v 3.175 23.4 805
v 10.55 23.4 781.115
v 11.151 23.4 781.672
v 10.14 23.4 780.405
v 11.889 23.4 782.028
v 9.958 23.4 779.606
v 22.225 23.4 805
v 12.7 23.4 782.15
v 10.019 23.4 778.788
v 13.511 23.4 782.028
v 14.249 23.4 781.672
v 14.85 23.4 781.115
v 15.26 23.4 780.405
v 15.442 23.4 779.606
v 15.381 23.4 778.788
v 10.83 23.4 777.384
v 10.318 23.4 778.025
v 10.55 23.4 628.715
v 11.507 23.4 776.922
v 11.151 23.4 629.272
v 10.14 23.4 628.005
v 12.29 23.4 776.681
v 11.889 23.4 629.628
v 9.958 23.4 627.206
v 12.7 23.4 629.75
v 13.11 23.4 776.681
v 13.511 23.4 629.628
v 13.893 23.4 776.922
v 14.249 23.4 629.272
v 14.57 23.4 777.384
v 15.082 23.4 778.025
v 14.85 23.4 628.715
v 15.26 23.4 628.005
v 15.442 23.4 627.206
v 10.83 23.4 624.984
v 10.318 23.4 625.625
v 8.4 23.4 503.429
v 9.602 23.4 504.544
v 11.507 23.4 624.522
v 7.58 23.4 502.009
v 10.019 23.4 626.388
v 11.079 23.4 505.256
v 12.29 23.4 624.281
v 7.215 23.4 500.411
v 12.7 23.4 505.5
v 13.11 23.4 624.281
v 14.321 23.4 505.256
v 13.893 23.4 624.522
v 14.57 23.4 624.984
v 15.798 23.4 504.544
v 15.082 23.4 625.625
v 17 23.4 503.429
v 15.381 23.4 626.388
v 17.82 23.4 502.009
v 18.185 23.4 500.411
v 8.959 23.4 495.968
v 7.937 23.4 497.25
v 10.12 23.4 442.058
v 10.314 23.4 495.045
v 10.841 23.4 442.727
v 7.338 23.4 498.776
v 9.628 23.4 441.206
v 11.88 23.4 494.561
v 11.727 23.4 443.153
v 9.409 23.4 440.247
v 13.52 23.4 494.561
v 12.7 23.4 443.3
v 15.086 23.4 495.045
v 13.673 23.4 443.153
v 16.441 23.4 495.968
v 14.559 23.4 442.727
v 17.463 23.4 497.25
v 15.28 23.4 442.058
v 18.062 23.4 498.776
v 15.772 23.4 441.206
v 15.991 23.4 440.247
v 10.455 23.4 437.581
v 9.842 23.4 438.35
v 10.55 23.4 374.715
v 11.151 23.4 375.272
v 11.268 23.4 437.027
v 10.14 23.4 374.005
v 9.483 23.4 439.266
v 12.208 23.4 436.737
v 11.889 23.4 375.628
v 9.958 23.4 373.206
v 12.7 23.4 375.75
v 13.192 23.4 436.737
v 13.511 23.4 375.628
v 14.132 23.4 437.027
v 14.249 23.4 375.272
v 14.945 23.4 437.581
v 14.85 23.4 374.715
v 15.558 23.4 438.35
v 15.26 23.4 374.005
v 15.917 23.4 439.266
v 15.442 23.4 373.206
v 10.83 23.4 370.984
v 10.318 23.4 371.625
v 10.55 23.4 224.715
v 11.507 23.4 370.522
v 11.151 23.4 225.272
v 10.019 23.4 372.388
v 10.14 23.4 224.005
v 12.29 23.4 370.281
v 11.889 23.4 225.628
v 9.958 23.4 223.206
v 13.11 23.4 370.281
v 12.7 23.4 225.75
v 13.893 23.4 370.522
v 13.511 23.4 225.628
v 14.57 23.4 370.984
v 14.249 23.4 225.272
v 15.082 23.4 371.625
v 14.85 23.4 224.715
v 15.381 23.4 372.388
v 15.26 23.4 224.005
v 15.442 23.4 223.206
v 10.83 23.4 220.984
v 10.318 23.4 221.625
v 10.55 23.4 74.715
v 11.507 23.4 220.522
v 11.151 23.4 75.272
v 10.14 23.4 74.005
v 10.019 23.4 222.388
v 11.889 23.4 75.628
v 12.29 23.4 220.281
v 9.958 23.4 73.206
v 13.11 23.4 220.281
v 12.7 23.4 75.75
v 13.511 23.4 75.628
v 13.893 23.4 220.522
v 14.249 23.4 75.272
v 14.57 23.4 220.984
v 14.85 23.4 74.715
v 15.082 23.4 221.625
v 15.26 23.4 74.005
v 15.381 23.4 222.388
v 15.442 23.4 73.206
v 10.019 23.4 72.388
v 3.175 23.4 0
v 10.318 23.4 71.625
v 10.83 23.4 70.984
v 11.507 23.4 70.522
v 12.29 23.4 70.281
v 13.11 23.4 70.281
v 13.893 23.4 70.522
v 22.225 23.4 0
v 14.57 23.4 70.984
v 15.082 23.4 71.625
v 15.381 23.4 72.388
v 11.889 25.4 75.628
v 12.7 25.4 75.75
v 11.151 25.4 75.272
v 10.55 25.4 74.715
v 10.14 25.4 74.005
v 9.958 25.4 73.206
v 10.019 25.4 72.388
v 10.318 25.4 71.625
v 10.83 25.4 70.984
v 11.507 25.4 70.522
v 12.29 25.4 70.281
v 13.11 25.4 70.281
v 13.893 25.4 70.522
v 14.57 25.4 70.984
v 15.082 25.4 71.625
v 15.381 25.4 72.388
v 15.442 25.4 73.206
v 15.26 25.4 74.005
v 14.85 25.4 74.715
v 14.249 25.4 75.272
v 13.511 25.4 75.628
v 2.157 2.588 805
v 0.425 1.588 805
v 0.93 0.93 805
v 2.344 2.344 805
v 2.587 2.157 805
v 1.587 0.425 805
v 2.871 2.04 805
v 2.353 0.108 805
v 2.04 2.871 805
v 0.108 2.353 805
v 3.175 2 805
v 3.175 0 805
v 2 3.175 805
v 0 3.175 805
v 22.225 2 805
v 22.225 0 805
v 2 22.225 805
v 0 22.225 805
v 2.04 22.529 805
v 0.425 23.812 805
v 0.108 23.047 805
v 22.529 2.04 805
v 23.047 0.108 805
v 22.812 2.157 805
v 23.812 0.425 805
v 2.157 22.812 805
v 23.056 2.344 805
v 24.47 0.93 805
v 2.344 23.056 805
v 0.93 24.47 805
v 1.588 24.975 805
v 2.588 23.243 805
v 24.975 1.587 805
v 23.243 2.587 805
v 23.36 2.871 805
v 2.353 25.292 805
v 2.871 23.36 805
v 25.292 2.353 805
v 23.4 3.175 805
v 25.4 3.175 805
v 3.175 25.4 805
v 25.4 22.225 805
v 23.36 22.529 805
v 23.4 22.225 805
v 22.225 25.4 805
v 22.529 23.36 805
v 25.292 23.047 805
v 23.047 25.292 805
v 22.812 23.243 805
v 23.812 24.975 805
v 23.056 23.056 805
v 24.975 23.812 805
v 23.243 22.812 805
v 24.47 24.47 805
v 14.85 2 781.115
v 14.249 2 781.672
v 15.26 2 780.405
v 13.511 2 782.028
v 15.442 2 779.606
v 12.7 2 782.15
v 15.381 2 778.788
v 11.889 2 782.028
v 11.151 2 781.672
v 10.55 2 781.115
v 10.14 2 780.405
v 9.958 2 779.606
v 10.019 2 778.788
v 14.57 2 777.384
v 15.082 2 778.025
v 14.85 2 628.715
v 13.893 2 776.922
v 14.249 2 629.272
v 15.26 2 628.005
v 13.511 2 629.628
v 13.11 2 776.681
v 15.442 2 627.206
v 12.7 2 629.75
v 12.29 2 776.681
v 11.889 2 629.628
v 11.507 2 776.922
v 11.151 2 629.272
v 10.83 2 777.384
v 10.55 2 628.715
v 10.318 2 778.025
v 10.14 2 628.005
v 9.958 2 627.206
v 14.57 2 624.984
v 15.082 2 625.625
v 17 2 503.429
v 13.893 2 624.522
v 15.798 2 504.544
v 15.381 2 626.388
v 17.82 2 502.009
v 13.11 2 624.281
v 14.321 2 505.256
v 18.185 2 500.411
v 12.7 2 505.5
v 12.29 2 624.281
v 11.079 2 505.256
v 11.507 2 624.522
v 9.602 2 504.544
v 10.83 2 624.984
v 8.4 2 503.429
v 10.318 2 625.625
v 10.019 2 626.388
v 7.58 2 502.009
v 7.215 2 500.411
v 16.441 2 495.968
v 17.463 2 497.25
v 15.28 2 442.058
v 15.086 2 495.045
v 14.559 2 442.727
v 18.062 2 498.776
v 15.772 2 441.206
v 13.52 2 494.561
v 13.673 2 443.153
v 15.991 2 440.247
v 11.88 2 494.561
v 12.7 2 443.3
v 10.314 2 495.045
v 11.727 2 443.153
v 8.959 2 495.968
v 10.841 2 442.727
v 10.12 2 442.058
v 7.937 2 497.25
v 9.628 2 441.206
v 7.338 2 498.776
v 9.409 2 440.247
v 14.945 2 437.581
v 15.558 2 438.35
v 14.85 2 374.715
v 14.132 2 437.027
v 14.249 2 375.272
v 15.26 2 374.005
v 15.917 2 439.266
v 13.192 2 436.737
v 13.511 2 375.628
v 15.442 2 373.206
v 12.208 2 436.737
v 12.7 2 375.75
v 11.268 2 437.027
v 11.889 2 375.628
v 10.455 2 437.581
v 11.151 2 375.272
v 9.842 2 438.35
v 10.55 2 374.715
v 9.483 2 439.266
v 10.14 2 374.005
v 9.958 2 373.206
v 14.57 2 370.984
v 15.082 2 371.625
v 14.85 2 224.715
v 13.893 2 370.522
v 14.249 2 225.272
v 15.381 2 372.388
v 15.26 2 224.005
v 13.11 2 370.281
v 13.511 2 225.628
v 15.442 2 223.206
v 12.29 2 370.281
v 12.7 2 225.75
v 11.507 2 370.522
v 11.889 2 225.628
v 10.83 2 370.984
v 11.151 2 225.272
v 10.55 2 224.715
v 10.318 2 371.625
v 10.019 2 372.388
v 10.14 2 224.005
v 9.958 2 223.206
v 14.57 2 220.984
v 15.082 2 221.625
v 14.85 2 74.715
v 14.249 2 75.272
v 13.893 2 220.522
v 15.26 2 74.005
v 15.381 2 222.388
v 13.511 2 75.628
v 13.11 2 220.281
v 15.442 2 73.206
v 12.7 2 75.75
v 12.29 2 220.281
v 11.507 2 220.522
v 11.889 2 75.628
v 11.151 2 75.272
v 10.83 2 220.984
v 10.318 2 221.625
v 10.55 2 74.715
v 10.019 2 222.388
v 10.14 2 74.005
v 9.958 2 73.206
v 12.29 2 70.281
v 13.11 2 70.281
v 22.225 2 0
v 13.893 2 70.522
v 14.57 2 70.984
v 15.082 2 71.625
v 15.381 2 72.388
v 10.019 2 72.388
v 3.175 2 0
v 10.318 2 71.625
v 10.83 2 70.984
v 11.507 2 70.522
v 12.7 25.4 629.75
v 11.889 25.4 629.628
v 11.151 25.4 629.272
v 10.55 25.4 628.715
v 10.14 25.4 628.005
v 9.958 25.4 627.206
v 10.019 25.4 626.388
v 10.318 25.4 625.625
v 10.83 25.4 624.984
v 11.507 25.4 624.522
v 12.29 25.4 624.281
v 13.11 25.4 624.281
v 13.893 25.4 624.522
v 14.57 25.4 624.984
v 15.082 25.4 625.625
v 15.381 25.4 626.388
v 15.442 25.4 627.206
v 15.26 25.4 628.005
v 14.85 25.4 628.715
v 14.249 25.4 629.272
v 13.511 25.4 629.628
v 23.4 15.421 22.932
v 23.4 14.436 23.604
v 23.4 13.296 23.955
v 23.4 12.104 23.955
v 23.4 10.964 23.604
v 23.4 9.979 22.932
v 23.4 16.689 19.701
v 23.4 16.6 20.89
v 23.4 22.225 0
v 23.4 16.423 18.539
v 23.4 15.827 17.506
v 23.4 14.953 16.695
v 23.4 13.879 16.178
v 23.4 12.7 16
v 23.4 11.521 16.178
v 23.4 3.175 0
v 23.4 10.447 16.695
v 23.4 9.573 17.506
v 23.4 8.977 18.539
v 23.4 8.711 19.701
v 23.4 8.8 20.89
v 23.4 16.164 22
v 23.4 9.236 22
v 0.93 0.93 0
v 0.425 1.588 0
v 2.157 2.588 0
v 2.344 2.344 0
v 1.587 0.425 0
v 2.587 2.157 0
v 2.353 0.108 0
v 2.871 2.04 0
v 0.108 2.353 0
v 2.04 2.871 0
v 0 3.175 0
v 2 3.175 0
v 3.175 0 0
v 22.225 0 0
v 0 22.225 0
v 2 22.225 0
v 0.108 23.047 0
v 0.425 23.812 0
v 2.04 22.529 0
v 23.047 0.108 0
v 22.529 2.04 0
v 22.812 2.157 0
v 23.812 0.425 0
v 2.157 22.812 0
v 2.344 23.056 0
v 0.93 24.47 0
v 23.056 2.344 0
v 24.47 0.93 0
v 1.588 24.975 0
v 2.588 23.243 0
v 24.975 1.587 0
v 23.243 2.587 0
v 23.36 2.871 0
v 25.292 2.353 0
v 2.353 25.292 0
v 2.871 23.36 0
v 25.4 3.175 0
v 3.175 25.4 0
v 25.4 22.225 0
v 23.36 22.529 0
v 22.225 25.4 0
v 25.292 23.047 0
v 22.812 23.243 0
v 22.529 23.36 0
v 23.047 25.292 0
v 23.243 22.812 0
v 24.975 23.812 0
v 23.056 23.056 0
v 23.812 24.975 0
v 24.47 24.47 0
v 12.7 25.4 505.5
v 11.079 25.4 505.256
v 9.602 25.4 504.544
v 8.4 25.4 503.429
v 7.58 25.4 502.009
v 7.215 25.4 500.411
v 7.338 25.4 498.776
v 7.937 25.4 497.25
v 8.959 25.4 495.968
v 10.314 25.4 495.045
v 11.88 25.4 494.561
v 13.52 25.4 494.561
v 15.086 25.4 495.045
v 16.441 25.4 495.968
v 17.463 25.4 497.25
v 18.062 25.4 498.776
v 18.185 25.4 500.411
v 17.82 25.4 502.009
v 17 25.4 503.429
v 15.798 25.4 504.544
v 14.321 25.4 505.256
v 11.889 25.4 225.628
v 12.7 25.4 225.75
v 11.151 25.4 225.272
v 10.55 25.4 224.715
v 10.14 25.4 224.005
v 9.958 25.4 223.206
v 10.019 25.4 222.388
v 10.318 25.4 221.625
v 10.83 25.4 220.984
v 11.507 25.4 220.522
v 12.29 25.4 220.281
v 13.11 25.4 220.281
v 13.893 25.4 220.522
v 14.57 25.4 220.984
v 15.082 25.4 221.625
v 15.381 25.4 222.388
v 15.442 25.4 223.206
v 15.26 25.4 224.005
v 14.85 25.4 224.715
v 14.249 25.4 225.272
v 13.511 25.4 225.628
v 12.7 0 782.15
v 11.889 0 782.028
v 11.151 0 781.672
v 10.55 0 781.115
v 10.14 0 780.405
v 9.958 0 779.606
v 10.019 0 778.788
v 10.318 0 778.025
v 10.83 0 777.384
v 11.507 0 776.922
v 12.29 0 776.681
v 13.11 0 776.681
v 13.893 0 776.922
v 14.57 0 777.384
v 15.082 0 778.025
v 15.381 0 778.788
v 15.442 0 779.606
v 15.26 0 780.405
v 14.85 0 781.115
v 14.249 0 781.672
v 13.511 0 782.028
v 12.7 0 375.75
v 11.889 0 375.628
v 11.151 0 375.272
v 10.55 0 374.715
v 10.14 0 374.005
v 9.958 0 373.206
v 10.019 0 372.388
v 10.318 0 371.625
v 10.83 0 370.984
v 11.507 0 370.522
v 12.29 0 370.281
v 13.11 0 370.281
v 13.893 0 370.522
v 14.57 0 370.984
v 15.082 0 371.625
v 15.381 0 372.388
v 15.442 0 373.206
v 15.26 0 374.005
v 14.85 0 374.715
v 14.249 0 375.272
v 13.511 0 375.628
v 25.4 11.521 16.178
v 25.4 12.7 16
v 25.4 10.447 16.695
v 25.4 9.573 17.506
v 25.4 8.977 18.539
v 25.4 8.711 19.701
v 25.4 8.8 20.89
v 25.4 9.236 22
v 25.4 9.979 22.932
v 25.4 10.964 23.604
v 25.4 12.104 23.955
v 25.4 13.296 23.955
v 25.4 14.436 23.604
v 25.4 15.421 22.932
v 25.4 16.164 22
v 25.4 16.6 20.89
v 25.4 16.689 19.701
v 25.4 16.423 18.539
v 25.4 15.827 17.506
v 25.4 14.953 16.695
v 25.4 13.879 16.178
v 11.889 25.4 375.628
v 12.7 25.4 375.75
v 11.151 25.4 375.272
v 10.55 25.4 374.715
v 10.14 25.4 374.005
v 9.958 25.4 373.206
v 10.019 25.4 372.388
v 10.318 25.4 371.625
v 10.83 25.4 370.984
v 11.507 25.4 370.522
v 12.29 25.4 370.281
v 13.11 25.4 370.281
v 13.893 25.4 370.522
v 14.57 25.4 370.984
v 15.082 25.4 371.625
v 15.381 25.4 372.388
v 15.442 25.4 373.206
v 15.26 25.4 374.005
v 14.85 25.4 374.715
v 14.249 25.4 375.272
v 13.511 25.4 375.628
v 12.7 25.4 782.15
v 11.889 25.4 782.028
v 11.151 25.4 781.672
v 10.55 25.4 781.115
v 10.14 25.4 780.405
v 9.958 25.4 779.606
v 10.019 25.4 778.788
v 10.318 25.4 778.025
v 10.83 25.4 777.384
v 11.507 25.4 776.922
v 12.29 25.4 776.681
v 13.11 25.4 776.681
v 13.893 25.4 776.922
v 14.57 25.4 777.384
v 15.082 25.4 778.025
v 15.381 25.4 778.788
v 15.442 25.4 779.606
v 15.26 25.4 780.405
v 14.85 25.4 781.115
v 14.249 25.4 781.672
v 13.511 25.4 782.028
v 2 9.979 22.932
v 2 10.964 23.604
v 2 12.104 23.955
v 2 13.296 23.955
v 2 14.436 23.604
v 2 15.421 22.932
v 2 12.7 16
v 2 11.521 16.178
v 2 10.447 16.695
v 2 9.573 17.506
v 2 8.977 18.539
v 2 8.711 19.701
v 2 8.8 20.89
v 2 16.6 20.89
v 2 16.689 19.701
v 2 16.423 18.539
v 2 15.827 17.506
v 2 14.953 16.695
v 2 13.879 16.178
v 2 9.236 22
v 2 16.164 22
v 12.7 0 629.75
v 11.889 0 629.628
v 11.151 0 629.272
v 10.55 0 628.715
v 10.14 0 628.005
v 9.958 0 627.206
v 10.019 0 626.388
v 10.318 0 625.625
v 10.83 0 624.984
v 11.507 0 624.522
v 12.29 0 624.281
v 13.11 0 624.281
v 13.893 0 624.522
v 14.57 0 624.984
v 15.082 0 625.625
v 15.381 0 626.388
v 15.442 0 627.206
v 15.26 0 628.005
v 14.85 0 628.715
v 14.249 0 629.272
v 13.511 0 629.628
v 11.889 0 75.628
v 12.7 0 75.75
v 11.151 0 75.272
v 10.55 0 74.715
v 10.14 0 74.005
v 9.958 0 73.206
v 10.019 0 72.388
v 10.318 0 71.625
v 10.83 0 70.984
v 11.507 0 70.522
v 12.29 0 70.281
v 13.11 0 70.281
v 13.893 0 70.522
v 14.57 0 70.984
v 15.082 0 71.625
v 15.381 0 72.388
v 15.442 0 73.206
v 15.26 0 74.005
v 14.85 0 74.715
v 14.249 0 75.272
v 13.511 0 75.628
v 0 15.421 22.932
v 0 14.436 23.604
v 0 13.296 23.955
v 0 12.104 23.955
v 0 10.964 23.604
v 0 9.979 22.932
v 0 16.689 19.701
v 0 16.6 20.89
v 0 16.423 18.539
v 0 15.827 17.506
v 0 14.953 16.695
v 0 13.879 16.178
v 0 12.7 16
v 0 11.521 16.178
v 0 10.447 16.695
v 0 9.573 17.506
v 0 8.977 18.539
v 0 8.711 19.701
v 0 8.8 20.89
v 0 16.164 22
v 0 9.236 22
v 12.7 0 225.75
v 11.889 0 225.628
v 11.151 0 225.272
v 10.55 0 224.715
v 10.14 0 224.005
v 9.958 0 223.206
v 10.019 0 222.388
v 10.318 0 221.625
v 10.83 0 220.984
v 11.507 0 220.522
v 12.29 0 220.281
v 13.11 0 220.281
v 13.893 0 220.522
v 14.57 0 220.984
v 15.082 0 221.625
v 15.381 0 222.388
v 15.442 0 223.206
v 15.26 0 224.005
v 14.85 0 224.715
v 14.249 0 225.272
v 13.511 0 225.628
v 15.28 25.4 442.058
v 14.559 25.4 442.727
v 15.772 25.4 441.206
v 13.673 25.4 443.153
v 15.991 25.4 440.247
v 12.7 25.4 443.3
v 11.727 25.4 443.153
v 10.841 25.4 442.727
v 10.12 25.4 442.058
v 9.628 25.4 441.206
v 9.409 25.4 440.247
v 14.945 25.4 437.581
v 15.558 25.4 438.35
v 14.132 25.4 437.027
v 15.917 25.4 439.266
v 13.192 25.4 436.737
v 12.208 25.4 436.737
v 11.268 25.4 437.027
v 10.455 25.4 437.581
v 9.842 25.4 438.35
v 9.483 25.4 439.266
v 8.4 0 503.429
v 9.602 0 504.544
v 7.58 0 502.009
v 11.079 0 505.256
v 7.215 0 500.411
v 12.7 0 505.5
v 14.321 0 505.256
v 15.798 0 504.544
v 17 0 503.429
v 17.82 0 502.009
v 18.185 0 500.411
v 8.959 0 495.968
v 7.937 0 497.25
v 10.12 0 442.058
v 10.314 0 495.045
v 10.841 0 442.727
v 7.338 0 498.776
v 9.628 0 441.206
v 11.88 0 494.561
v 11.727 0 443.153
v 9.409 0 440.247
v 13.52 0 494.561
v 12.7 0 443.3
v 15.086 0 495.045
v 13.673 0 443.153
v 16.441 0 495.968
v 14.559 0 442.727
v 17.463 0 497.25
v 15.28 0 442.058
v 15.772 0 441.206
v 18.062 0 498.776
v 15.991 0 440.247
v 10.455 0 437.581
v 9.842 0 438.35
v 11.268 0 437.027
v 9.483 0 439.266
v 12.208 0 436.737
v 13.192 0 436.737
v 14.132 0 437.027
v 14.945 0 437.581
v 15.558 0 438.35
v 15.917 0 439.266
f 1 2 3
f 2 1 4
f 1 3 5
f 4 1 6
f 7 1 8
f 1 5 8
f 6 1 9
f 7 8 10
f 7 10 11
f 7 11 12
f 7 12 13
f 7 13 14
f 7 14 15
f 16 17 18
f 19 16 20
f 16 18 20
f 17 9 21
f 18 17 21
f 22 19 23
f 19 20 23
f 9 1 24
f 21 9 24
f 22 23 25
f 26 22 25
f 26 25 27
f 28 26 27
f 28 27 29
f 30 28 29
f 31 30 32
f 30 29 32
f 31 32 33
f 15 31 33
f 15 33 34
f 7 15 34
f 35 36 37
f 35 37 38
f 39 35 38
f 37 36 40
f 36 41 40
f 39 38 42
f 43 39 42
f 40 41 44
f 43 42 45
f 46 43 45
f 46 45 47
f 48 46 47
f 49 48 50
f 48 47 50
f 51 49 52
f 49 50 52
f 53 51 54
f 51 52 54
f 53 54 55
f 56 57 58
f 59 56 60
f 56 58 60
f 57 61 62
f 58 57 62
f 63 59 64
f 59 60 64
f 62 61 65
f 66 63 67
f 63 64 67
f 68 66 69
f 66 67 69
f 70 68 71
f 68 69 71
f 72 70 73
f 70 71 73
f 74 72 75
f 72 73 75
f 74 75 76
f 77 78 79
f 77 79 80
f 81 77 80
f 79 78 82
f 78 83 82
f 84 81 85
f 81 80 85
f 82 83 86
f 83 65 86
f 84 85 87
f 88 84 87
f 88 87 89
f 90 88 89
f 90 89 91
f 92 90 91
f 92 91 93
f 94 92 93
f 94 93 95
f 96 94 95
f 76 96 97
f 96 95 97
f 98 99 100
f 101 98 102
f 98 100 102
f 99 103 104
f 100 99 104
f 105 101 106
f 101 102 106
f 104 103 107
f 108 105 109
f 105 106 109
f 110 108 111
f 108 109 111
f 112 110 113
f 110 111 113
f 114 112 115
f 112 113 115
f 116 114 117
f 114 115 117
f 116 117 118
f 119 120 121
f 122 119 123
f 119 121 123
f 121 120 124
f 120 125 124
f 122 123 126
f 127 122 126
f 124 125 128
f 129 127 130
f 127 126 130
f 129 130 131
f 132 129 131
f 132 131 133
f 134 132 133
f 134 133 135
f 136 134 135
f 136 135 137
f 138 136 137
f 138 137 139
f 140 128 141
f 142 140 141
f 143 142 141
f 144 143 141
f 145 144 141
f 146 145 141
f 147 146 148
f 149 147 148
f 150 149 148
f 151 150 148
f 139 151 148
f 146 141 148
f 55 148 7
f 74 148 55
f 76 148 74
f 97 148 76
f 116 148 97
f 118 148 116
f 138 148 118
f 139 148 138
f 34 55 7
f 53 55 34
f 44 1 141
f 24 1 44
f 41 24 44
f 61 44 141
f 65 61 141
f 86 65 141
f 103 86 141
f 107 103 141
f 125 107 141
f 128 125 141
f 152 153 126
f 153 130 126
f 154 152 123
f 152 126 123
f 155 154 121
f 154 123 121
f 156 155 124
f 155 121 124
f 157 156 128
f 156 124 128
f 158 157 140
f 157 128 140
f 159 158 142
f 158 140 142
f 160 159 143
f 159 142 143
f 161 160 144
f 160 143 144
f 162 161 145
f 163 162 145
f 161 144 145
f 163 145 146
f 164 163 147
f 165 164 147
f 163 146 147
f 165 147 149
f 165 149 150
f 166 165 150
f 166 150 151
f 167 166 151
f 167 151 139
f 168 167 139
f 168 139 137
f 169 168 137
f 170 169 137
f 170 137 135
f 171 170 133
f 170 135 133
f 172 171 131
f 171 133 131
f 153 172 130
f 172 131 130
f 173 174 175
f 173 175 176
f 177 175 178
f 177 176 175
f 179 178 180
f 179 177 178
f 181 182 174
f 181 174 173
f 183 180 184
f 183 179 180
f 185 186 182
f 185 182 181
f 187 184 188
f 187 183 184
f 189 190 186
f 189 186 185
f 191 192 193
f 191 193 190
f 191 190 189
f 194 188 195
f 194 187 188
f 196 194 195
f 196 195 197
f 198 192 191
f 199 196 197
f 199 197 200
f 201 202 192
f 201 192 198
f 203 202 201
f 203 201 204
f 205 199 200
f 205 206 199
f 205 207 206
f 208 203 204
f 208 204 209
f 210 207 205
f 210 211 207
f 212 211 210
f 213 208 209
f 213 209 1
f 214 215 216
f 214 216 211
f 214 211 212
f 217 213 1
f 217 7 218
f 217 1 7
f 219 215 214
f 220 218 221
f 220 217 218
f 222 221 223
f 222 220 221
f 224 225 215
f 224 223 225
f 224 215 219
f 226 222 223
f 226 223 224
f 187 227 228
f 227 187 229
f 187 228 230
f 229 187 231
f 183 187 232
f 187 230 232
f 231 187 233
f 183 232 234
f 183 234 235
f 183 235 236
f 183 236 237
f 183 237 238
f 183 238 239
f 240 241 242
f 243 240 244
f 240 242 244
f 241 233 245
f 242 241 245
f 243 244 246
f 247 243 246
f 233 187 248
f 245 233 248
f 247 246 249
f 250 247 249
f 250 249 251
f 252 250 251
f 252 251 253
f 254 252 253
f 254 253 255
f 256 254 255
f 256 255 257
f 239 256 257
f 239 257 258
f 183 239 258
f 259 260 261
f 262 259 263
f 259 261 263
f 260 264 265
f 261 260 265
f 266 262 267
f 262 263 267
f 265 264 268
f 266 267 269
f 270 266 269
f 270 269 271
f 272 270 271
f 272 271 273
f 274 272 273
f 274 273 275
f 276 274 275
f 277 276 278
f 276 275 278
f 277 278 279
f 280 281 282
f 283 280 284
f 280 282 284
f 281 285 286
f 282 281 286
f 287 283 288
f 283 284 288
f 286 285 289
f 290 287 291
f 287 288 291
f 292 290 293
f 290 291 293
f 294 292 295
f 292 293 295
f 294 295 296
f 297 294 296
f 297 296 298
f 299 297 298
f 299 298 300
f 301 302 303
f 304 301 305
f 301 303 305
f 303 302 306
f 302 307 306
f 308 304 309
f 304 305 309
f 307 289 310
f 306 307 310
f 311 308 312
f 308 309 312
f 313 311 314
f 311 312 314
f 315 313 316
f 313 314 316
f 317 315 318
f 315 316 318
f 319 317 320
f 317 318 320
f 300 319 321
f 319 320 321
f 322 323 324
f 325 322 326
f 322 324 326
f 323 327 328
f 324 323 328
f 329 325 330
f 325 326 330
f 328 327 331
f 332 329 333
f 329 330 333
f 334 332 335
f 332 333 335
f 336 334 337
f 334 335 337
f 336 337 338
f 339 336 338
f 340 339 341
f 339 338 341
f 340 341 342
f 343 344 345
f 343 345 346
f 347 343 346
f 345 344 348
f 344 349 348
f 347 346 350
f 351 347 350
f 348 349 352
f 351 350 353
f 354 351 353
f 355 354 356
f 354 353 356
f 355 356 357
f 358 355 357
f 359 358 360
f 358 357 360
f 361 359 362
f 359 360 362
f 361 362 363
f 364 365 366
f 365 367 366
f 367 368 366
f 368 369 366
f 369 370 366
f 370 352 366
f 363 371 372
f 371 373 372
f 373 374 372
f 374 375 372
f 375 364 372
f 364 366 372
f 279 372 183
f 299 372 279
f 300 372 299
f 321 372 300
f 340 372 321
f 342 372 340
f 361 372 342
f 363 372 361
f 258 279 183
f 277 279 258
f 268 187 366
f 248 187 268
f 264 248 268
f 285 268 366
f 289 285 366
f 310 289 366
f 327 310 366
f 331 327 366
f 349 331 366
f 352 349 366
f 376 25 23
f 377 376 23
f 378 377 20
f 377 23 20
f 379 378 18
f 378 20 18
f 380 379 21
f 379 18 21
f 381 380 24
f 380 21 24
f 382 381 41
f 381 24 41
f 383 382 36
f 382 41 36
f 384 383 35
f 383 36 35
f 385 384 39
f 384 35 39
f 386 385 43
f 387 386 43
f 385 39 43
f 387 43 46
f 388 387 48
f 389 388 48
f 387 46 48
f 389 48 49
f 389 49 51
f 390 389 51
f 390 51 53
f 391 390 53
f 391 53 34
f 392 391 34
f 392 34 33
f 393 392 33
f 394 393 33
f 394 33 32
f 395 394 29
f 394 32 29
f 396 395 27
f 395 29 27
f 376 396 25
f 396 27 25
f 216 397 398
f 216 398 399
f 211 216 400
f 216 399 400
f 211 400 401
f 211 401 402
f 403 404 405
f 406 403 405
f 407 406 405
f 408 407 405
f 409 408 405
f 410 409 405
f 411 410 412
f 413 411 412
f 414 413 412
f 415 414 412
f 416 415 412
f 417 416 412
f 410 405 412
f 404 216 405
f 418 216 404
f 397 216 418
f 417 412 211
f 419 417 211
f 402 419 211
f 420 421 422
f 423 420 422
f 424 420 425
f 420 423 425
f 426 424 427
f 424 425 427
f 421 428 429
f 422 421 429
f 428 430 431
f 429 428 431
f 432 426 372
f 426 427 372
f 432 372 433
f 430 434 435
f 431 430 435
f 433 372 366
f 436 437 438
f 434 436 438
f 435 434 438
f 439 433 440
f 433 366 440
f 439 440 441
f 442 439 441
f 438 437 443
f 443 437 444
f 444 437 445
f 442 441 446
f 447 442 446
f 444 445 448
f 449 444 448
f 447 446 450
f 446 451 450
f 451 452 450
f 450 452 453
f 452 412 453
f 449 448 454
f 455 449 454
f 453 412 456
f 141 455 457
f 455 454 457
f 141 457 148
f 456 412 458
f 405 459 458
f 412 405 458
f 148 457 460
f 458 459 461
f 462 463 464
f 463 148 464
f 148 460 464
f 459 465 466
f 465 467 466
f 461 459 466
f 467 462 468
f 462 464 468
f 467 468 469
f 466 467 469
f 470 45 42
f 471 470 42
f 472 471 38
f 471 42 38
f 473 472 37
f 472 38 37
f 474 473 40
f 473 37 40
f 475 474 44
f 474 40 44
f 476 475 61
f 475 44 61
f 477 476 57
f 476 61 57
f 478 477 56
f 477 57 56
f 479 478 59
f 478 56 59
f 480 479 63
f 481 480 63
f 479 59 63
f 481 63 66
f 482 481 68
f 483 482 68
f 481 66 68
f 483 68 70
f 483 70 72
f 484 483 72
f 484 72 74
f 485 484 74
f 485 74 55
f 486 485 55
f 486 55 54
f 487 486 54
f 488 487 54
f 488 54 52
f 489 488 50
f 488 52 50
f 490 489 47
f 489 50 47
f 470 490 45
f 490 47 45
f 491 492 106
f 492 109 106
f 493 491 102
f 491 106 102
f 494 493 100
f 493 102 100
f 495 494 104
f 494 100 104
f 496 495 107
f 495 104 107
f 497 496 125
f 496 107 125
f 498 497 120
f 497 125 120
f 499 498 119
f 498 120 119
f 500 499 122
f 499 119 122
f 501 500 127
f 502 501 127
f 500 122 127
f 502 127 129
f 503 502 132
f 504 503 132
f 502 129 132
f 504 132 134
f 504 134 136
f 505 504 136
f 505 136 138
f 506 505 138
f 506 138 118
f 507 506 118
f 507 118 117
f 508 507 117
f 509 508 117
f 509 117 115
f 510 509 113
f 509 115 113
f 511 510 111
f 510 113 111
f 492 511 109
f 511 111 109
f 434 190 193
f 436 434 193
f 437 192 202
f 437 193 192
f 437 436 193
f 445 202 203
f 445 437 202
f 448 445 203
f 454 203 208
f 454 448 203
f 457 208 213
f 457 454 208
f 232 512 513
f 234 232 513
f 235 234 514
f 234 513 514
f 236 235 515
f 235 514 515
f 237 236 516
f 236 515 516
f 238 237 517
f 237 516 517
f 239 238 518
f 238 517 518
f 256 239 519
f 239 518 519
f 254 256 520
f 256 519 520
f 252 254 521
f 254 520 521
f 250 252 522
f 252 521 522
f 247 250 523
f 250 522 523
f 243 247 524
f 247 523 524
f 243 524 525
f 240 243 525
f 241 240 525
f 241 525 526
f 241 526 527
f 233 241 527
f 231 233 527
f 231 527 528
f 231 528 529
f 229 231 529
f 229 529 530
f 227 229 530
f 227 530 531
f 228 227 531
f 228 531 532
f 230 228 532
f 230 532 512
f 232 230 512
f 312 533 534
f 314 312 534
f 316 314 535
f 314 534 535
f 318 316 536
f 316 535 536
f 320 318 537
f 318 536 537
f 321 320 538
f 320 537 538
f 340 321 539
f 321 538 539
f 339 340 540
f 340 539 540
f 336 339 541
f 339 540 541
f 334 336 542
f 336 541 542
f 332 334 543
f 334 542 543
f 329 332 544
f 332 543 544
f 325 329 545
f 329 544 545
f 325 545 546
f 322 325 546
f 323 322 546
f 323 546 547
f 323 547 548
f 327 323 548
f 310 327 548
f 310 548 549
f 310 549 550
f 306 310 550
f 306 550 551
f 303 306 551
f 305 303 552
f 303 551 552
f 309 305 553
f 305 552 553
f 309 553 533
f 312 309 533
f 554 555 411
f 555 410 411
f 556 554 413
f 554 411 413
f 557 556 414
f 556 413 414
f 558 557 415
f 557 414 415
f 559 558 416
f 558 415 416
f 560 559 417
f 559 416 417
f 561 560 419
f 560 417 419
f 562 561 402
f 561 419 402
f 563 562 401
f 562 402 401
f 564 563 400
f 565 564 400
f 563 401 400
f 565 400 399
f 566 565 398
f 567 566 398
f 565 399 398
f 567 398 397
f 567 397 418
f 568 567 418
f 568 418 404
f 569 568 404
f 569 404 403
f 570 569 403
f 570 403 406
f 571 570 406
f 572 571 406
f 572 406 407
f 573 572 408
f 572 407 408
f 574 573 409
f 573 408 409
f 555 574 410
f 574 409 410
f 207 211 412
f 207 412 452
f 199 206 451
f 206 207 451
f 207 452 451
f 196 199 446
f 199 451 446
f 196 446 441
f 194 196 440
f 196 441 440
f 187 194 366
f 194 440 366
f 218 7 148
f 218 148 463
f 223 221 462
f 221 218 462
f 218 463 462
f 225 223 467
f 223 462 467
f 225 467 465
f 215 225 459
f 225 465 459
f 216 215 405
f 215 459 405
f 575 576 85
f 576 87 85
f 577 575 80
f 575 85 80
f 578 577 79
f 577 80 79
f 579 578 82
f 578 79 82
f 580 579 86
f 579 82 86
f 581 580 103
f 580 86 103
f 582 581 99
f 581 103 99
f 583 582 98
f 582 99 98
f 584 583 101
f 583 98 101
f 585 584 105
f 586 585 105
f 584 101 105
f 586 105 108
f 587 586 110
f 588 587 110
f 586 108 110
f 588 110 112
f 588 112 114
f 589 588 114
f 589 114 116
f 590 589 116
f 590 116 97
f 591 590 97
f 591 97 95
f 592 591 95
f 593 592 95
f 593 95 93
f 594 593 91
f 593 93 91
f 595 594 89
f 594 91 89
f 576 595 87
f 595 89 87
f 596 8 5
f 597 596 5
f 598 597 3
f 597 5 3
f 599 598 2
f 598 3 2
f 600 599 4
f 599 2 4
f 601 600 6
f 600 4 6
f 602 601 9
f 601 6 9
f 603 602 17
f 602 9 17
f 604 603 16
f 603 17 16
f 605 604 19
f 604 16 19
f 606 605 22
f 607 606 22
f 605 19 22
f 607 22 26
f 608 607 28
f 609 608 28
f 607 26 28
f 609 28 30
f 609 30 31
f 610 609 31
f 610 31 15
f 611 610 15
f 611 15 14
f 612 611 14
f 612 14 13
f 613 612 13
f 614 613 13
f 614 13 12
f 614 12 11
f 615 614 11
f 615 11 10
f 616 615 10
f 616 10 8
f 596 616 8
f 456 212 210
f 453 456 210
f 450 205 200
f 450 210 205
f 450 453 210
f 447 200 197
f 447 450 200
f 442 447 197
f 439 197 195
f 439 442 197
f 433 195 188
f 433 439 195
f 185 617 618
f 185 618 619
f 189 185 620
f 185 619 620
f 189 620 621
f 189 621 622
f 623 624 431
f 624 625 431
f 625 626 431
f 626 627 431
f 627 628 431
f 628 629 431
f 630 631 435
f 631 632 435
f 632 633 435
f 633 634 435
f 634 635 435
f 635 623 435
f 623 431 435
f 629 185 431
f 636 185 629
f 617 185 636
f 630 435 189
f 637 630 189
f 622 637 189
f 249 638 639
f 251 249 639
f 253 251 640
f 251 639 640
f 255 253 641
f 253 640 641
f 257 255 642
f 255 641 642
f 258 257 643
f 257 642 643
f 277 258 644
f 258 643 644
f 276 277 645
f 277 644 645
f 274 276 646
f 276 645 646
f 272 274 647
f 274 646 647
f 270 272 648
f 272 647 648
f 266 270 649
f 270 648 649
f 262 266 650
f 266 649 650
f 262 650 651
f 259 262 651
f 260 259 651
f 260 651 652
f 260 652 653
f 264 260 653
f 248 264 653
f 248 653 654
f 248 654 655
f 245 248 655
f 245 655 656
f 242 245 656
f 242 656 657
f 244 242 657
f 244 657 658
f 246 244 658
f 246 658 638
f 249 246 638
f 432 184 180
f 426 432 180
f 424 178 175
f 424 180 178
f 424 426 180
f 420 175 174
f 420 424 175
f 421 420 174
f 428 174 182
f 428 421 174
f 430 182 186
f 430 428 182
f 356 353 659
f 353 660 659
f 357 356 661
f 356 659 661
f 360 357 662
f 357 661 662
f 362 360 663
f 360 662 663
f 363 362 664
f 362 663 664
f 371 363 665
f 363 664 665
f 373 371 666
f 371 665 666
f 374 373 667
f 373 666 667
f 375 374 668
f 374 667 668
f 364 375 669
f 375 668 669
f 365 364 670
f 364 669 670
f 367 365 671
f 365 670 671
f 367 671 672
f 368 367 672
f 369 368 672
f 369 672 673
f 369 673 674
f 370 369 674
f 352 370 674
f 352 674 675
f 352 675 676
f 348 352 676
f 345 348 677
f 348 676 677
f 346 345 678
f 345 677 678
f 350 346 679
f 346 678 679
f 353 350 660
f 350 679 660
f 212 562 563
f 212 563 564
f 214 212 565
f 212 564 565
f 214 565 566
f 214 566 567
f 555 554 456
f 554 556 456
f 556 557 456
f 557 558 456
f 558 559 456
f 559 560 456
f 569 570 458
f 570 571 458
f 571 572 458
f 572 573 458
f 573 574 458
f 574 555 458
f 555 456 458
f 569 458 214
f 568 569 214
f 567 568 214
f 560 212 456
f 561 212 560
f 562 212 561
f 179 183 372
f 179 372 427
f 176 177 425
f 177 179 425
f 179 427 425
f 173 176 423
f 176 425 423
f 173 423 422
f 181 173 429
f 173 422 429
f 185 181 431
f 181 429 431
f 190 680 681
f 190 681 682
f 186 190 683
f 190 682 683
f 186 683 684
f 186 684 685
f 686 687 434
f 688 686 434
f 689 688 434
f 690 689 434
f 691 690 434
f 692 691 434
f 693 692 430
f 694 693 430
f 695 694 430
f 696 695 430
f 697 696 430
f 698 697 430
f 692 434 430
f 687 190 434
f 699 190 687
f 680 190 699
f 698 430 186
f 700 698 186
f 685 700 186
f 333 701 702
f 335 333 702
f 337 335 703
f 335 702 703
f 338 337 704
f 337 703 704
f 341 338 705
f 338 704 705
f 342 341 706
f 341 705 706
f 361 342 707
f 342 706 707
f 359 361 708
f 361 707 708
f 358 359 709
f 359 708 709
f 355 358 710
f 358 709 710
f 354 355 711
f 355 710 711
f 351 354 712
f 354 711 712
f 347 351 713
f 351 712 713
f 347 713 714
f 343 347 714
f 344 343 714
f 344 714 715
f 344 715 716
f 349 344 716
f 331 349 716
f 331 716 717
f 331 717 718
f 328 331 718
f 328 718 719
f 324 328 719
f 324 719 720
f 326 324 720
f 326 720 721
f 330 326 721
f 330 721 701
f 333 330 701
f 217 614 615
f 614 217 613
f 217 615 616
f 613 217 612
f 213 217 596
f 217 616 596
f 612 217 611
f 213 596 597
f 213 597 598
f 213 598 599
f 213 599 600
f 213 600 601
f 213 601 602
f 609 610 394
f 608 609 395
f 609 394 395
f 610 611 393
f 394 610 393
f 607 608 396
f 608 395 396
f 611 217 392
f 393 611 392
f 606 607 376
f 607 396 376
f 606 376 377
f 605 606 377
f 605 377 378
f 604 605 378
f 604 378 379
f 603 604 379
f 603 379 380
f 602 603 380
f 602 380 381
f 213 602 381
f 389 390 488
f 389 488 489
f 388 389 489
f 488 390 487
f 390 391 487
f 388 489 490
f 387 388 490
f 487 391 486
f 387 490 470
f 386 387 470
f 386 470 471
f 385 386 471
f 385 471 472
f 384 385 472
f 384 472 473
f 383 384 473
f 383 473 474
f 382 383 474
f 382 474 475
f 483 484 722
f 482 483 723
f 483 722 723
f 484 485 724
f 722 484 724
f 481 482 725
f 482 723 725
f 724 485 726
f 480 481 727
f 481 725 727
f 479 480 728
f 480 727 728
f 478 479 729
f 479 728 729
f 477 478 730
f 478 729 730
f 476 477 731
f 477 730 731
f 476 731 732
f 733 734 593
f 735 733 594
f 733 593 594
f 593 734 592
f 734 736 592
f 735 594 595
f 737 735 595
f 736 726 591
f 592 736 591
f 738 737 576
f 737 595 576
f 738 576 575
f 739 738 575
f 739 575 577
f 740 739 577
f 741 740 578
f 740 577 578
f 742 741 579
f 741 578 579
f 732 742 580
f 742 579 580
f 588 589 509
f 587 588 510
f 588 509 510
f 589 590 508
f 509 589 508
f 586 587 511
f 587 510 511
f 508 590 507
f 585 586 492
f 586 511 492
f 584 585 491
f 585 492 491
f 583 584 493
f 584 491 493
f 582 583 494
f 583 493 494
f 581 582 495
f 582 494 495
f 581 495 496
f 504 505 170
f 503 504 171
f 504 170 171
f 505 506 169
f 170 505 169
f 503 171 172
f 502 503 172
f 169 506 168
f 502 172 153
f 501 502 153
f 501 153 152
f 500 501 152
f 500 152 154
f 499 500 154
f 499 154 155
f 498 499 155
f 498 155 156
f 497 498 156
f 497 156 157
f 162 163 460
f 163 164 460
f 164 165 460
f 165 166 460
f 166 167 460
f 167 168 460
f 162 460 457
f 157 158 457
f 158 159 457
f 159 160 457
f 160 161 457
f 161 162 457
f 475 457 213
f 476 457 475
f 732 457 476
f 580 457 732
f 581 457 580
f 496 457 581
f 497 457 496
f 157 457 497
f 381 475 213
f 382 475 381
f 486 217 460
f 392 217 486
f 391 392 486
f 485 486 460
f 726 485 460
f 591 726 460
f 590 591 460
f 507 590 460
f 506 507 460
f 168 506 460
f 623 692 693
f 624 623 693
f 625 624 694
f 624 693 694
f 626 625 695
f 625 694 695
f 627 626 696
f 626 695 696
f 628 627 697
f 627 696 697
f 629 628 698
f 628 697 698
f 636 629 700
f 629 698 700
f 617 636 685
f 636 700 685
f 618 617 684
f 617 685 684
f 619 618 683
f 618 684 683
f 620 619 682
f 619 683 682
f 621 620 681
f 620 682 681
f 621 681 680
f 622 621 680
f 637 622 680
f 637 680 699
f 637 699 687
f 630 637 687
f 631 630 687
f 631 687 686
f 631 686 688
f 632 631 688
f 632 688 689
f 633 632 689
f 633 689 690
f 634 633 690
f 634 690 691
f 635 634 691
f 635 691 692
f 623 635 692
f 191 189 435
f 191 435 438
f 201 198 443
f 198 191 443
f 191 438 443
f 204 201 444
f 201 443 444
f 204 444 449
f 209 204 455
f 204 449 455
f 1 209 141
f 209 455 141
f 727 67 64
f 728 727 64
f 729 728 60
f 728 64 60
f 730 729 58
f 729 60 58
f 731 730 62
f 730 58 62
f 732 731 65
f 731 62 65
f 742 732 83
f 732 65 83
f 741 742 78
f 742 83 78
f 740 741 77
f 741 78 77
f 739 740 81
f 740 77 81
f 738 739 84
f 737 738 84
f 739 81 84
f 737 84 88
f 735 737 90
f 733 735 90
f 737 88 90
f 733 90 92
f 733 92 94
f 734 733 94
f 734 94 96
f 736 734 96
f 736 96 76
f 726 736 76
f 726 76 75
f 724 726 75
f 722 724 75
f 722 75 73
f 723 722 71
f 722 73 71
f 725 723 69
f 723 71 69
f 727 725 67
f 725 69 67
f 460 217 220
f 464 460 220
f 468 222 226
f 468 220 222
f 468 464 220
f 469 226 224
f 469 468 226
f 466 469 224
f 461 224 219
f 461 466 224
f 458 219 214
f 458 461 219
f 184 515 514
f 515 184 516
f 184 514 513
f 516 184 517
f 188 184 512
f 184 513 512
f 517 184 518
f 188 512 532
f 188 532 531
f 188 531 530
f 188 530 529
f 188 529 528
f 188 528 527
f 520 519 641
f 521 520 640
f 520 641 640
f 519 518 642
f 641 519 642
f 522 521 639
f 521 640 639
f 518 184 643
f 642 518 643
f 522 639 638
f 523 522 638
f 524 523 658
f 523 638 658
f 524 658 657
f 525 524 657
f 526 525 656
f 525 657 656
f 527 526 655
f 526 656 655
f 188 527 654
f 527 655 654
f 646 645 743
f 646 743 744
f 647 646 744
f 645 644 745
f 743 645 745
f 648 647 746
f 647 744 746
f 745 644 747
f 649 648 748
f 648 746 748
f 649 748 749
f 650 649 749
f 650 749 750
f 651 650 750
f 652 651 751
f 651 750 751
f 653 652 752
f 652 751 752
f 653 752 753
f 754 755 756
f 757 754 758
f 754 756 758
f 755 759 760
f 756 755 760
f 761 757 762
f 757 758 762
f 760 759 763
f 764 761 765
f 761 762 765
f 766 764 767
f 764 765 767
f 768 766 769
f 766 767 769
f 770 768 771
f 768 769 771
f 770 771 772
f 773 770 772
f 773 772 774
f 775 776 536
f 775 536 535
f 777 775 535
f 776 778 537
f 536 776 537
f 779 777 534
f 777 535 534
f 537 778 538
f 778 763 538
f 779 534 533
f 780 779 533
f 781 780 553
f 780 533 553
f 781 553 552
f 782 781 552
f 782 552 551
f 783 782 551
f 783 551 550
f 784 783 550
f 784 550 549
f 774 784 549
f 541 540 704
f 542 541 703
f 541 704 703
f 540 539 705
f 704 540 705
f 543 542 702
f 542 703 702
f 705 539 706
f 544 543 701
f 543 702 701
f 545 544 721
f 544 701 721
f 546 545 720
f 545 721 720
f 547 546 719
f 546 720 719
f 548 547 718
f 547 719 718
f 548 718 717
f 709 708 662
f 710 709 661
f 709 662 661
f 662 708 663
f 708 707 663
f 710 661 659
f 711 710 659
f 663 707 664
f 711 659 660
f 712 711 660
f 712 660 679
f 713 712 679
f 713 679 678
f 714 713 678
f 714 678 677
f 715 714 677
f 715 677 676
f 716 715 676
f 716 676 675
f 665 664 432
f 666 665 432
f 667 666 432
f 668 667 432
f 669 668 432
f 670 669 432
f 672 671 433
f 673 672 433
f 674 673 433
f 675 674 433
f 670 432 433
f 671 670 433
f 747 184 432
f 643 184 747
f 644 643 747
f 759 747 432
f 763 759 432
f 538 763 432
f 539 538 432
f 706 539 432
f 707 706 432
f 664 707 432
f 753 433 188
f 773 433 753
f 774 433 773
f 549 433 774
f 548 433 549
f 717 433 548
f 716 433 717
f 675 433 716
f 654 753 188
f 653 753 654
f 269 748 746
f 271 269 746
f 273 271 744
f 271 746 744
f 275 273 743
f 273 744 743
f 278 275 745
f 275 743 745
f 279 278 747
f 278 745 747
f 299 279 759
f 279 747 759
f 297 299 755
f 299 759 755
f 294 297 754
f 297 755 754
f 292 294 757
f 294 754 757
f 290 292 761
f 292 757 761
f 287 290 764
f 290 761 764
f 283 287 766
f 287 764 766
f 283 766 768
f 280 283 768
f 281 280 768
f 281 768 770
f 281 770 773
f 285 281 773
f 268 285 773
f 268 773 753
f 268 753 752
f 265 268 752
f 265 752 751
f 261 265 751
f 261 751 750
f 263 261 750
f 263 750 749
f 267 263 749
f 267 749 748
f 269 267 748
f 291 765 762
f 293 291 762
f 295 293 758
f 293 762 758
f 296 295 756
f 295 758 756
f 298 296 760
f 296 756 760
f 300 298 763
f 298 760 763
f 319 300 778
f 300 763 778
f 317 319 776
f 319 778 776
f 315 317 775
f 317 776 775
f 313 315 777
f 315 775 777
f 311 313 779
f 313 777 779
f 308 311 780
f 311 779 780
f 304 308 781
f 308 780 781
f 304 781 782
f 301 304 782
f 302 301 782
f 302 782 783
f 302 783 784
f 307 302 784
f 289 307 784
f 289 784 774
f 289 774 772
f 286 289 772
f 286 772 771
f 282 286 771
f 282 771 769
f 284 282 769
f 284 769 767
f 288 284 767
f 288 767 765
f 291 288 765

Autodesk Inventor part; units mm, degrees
ref_plane "YZ Plane" through (0, 0, 0) normal (1, 0, 0) x (0, 1, 0)
ref_plane "XZ Plane" through (0, 0, 0) normal (0, 1, 0) x (-1, 0, 0)
ref_plane "XY Plane" through (0, 0, 0) normal (0, 0, 1) x (1, 0, 0)
sketch "Sketch1" plane through (0, 0, 0) normal (0, 0, 1) x (1, 0, 0)
  line L0 (3.175, 0) -> (22.225, 0)
  line L1 (25.4, 3.175) -> (25.4, 22.225)
  line L2 (22.225, 25.4) -> (3.175, 25.4)
  line L3 (0, 22.225) -> (0, 3.175)
  arc A0 (3.175, 25.4) -> (0, 22.225) centre (3.175, 22.225) ccw
  arc A1 (0, 3.175) -> (3.175, 0) centre (3.175, 3.175) ccw
  arc A2 (22.225, 0) -> (25.4, 3.175) centre (22.225, 3.175) ccw
  arc A3 (25.4, 22.225) -> (22.225, 25.4) centre (22.225, 22.225) ccw
  line L4 (3.175, 23.4) -> (22.225, 23.4)
  arc A4 (23.4, 22.225) -> (22.225, 23.4) centre (22.225, 22.225) ccw
  line L5 (23.4, 22.225) -> (23.4, 3.175)
  arc A5 (22.225, 2) -> (23.4, 3.175) centre (22.225, 3.175) ccw
  line L6 (22.225, 2) -> (3.175, 2)
  arc A6 (2, 3.175) -> (3.175, 2) centre (3.175, 3.175) ccw
  line L7 (2, 3.175) -> (2, 22.225)
  arc A7 (3.175, 23.4) -> (2, 22.225) centre (3.175, 22.225) ccw
  point P0 (0, 0)
  point P1 (25.4, 0)
  point P2 (0, 25.4)
  dimension "d0" = 25.4
  dimension "d1" = 25.4
  dimension "d2" = 3.175
  dimension "d3" = 2
extrude "Extrusion1" add sketch "Sketch1" along normal blind 1000
sketch "Sketch11" plane through (3.175, 25.4, 1000) normal (0, 1, 0) x (1, 0, 0)
  circle A0 centre (9.525, 500) radius 4.7917
  point P0 (-3.175, 1000)
hole "centerHole" at (12.7, 25.4, 500) direction (0, -1, 0) diameter 11 end through all clearance for "Flat Head Machine Screw" size "M10" standard "Ansi Metric M Profile"
sketch "Sketch12" plane through (3.175, 25.4, 1000) normal (0, 1, 0) x (1, 0, 0)
  line L0 (0, 1000) -> (0, 0) projected
  circle A0 centre (9.525, 927) radius 1.5875
  circle A1 centre (9.525, 777) radius 1.5875
  circle A2 centre (9.525, 627) radius 1.5875
  circle A3 centre (9.525, 500) radius 5.5 projected
  point P0 (-3.175, 1000)
  dimension "d76" = 3.175
  dimension "d80" = 150
  dimension "d140" = 127
hole "longSideHoles" at (12.7, 25.4, 73) at (12.7, 25.4, 223) at (12.7, 25.4, 373) direction (0, -1, 0) diameter 5.5 end through all
sketch "Sketch13" plane through (3.175, 25.4, 1000) normal (0, 1, 0) x (1, 0, 0)
  line L0 (0, 1000) -> (0, 0) projected
  circle A0 centre (9.525, 68.2) radius 1.5875
  circle A1 centre (9.525, 220.6) radius 1.5875
  circle A2 centre (9.525, 373) radius 1.5875
  circle A3 centre (9.525, 500) radius 5.5 projected
  point P0 (-3.175, 1000)
  dimension "d96" = 152.4
  dimension "d137" = 127
  dimension "d138" = 152.4
hole "shortSideHoles" at (12.7, 25.4, 627) at (12.7, 25.4, 779.4) at (12.7, 25.4, 931.8) direction (0, -1, 0) diameter 5.5 end through all
sketch "Sketch14" plane through (25.4, 22.225, 1000) normal (1, 0, 0) x (0, 0, -1)
  line L0 (1000, -19.05) -> (1000, 0) projected
  line L1 (0, -19.05) -> (0, 0) projected
  circle A0 centre (30, -9.525) radius 4.7625
  circle A1 centre (980, -9.525) radius 4.7625
  point P0 (1000, -22.225)
  dimension "d108" = 9.525
  dimension "d109" = 30
  dimension "d110" = 9.525
  dimension "d111" = 20
hole "shackleHole" at (25.4, 12.7, 970) at (25.4, 12.7, 20) direction (-1, 0, 0) diameter 8 end through all
sketch "Sketch15" plane through (3.175, 25.4, 1000) normal (0, 1, 0) x (1, 0, 0)
  circle A0 centre (9.525, 500) radius 5.5 projected
  circle A1 centre (9.525, 560) radius 3.175
  point P0 (-3.175, 1000)
  dimension "d119" = 6.35
  dimension "d120" = 60
hole "collarHole" at (12.7, 25.4, 440) direction (0, -1, 0) diameter 6.6 end through all clearance for "Flat Head Machine Screw" size "M6" standard "Ansi Metric M Profile"
sketch "Sketch16" plane through (0, 0, 1000) normal (0, 0, 1) x (1, 0, 0)
  arc A0 (23.4, 22.225) -> (22.225, 23.4) centre (22.225, 22.225) ccw projected
  line L0 (23.4, 22.225) -> (23.4, 3.175) projected
  arc A1 (22.225, 2) -> (23.4, 3.175) centre (22.225, 3.175) ccw projected
  line L1 (22.225, 2) -> (3.175, 2) projected
  arc A2 (2, 3.175) -> (3.175, 2) centre (3.175, 3.175) ccw projected
  line L2 (2, 3.175) -> (2, 22.225) projected
  arc A3 (3.175, 23.4) -> (2, 22.225) centre (3.175, 22.225) ccw projected
  line L3 (3.175, 23.4) -> (22.225, 23.4) projected
  line L4 (0, 22.225) -> (0, 3.175) projected
  arc A4 (0, 3.175) -> (3.175, 0) centre (3.175, 3.175) ccw projected
  line L5 (3.175, 0) -> (22.225, 0) projected
  arc A5 (22.225, 0) -> (25.4, 3.175) centre (22.225, 3.175) ccw projected
  line L6 (25.4, 3.175) -> (25.4, 22.225) projected
  arc A6 (25.4, 22.225) -> (22.225, 25.4) centre (22.225, 22.225) ccw projected
  line L7 (22.225, 25.4) -> (3.175, 25.4) projected
  arc A7 (3.175, 25.4) -> (0, 22.225) centre (3.175, 22.225) ccw projected
  point P0 (0, 0)
extrude "removeSide" cut sketch "Sketch16" against normal blind 195
equation "\"d0\" = tube"
equation "\"d1\" = tube"
equation "\"tube\" = 25.4"
properties part number "2f2al" material "Steel"
